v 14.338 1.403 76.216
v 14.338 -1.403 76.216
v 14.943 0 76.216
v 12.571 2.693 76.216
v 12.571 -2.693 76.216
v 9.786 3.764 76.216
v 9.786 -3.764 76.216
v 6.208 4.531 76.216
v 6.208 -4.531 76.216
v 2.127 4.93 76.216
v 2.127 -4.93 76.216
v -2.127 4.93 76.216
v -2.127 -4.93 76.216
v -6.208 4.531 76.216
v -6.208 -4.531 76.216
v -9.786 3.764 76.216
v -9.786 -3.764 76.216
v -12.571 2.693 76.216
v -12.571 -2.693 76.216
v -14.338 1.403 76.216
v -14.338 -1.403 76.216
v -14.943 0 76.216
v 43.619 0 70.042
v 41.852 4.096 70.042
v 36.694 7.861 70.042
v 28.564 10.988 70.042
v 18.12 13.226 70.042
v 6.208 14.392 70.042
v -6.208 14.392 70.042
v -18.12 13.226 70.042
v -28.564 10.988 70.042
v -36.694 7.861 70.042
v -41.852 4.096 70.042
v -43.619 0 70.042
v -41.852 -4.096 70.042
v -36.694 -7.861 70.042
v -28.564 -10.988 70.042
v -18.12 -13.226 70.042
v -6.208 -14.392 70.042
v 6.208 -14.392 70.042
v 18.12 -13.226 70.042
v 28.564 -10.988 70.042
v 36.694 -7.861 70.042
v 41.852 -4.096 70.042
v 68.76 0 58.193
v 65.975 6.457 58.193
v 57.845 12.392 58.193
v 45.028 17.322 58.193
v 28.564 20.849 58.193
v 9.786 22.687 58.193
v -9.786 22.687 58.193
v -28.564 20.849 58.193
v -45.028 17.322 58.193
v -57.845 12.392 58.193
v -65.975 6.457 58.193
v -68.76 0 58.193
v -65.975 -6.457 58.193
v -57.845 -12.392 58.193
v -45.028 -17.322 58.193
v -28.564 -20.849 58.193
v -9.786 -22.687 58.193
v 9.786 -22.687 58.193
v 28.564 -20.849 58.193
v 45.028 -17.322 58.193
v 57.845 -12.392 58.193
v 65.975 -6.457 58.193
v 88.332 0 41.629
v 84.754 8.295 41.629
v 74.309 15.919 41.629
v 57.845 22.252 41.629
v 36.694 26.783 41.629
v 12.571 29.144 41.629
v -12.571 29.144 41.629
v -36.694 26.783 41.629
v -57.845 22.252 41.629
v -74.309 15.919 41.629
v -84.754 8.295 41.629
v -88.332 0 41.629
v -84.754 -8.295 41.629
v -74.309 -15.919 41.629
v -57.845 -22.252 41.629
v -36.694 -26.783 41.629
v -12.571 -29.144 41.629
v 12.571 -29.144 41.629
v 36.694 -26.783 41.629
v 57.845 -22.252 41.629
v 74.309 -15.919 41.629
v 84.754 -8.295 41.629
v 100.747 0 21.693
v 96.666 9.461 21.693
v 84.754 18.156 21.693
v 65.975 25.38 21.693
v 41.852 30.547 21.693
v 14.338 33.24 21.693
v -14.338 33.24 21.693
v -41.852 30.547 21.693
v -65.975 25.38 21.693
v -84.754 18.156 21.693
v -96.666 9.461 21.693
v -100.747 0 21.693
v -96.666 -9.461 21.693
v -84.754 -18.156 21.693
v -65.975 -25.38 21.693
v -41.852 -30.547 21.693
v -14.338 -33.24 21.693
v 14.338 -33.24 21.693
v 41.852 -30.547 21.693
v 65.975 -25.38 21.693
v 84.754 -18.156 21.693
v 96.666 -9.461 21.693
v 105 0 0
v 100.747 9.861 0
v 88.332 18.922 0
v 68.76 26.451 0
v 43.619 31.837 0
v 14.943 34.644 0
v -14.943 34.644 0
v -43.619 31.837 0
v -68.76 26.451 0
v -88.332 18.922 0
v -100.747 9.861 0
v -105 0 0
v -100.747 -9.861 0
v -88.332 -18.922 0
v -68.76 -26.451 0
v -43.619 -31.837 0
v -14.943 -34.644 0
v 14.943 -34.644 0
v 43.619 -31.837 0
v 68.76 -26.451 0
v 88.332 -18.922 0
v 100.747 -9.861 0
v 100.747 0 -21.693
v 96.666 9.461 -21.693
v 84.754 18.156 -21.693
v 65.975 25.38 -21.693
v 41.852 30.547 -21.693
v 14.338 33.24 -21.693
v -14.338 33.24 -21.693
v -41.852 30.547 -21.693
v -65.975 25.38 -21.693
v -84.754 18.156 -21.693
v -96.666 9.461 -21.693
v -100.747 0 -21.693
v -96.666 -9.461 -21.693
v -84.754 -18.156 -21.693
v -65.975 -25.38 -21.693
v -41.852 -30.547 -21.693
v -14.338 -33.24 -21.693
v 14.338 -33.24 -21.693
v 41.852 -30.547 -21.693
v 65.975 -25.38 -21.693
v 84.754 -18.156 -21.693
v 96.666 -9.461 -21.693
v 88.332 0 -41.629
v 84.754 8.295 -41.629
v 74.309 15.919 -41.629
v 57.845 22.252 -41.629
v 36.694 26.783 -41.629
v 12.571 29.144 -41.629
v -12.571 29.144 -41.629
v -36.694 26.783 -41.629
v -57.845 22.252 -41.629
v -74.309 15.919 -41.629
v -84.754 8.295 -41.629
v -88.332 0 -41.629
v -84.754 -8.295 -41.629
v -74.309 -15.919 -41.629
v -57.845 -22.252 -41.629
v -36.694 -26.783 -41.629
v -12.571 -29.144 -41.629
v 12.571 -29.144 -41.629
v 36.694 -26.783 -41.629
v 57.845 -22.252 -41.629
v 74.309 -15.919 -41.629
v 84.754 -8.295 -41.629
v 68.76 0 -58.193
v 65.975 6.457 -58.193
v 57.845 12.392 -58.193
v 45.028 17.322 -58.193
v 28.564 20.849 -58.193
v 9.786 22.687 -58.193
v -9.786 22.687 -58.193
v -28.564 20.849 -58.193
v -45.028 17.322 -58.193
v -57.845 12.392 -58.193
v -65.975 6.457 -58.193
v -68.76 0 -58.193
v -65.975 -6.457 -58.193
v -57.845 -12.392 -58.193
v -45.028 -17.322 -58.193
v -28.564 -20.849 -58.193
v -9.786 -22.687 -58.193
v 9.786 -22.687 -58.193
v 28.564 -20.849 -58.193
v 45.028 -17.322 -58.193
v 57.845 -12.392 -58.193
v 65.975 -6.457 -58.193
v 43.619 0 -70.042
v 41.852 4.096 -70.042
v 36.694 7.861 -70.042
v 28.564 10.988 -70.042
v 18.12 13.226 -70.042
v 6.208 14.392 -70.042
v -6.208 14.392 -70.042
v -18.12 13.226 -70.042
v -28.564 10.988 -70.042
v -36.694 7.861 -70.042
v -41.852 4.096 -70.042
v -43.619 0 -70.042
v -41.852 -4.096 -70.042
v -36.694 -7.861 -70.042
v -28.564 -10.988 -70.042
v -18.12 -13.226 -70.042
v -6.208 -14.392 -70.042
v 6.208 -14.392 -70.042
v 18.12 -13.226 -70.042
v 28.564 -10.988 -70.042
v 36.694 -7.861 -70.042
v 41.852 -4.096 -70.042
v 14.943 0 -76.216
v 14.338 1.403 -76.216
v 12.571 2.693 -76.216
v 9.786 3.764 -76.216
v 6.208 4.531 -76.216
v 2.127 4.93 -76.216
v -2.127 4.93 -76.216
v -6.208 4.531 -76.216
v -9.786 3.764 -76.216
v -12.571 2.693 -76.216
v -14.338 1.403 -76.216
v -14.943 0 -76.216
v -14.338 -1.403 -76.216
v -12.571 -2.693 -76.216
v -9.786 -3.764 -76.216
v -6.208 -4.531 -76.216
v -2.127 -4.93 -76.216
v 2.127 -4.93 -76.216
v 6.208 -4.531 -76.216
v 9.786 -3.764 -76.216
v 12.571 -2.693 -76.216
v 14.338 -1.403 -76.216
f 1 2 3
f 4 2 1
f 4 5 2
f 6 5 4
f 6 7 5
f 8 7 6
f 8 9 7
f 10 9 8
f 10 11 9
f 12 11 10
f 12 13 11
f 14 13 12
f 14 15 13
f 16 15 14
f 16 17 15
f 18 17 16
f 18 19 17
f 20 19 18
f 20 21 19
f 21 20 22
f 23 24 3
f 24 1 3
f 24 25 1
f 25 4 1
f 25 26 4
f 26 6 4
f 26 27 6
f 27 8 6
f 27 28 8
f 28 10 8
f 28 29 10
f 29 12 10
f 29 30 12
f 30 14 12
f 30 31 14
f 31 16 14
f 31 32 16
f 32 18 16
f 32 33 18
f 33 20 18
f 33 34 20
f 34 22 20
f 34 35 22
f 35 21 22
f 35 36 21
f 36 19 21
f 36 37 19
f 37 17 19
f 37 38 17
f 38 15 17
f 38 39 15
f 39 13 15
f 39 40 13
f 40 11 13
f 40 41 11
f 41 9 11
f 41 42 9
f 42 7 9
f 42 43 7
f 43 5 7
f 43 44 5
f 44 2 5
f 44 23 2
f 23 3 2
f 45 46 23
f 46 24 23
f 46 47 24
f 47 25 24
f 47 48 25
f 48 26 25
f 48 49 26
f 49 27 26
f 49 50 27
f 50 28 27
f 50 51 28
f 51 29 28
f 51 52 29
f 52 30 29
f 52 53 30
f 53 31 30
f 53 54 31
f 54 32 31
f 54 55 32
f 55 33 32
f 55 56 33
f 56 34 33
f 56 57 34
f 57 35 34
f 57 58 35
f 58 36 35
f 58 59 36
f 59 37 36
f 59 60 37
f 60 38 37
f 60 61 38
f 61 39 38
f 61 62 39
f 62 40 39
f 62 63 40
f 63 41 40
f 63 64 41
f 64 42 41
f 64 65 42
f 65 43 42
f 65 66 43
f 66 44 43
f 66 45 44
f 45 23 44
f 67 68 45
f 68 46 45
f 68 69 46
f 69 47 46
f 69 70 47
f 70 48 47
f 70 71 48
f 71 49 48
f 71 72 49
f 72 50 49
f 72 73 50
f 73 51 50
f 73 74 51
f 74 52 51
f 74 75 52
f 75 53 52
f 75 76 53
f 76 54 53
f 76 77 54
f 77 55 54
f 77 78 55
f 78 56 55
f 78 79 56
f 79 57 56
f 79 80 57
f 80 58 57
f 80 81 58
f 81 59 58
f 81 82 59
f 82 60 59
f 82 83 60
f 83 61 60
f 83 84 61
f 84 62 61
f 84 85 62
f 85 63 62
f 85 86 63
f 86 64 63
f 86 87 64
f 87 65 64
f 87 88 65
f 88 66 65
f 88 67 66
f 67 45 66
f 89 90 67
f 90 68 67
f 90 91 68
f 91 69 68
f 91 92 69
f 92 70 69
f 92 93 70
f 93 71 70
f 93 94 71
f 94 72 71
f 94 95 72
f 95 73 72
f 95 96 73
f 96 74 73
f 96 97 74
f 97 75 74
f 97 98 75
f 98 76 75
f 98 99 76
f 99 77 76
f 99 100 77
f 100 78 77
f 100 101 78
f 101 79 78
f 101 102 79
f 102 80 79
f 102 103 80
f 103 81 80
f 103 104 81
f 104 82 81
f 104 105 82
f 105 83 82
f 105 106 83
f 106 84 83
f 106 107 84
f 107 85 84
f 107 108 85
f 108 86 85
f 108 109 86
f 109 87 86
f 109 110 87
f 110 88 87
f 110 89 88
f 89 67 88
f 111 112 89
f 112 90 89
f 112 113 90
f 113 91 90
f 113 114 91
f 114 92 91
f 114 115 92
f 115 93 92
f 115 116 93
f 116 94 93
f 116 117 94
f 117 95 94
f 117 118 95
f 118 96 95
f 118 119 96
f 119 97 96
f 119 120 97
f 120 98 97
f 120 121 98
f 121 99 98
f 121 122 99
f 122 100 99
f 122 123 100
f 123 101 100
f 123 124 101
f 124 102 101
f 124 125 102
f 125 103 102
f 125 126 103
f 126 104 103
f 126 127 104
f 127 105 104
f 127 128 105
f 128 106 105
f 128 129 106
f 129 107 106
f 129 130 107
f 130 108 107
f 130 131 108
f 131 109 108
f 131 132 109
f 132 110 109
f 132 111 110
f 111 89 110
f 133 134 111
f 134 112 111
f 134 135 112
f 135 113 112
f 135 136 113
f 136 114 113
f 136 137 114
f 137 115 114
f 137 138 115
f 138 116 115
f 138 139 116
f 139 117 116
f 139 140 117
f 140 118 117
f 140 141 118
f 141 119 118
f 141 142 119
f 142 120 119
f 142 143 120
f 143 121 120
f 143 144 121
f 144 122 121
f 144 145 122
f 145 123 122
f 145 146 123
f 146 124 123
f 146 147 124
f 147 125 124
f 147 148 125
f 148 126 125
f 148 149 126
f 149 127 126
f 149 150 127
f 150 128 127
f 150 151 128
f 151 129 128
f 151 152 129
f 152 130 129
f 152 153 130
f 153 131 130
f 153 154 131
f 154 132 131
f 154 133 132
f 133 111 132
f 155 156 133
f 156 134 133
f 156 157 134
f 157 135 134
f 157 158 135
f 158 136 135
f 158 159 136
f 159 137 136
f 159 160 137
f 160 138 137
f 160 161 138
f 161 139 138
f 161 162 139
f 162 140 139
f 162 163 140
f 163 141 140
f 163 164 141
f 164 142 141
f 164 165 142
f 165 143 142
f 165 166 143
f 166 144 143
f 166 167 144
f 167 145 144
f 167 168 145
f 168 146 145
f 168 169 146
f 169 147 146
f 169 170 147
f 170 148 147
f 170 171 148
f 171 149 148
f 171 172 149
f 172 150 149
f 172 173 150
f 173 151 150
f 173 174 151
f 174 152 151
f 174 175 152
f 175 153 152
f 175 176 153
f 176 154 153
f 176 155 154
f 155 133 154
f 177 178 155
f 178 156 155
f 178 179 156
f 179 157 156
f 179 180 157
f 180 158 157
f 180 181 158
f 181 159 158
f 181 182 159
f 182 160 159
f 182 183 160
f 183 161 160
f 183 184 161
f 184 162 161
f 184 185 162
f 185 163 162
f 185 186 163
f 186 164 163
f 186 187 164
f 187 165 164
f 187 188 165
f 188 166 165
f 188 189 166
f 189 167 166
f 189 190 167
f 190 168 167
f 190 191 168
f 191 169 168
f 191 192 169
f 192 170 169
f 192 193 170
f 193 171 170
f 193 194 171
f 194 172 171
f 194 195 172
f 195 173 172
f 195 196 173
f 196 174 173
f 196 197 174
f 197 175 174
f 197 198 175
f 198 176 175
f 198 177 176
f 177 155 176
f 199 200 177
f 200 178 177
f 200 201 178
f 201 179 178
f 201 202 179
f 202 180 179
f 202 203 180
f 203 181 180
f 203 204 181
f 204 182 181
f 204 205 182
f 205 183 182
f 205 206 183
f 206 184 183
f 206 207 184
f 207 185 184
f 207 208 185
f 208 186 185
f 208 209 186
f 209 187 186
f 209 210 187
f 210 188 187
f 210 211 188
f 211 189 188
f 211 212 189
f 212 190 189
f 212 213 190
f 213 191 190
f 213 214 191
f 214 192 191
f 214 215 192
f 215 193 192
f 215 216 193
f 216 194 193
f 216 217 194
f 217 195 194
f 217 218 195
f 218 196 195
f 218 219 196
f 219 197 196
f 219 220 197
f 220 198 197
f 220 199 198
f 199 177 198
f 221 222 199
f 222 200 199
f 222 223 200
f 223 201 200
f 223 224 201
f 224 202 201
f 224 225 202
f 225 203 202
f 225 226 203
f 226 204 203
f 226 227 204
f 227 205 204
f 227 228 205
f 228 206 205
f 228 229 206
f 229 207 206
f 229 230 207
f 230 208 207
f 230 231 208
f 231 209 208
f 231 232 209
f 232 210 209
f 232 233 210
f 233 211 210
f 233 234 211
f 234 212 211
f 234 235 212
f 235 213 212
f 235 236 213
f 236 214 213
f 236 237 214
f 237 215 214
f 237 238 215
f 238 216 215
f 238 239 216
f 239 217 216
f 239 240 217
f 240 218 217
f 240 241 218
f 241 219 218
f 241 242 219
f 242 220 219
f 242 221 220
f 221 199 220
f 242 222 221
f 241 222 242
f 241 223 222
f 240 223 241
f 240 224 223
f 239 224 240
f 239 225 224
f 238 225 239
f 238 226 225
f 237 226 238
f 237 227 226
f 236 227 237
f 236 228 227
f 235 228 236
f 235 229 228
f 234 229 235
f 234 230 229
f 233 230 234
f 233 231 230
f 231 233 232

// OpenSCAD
// Generated by SolidPython 1.0.1 on 2020-07-29 00:46:51


scale(v = [15, 5, 11]) {
	sphere(r = 7);
}
/***********************************************
*********      SolidPython code:      **********
************************************************
 
# import packages: SolidPython
from solid import *
from solid.utils import *
from itertools import chain, combinations, permutations


class Resize:

    def __init__(self, scad_file):
        self.scad_file = scad_file
        #self.scad_file = import_scad(scad_file)
        # cone/cylinder param:
        self.r1 = 0
        self.r2 = 0
        self.h = 0
        # rectangular prism param:
        self.w = 0
        self.l = 0
        # ellipse param:
        self.r = 0

    # import OpenScad code (file name corresponds to shape)


    # classify shape + parameters
    def assign(self, param1, param2, param3):
        if self.scad_file == 'cone.scad':
            self.r1 = param1
            self.r2 = param2
            self.h = param3
        elif self.scad_file == 'cylinder.scad':
            self.r1 = param1
            self.r2 = param2
            self.h = param3
        elif self.scad_file == 'rectangularPrism.scad':
            self.h = param1
            self.l = param2
            self.w = param3
        else:
            self.r = param1
            self.h = param2

    # resize parameters
    def iterate(self):
        x = range(3, 20, 2)
        i = 1
        if self.scad_file == 'cone.scad':
            tempList = list(permutations(x, 2))
            for temp in tempList:
                param1 = temp[0]
                param2 = temp[1]
                filepath = 'produced_scad_files/' + 'cone' + str(param1) + '_' + str(param2) + '_' + '.scad'
                scad_render_to_file(cylinder(h=param1, r1=param2, r2=0), filepath)

        elif self.scad_file == 'cylinder.scad':
            tempList = list(permutations(x, 3))
            for temp in tempList:
                param1 = temp[0]
                param2 = temp[1]
                filepath = 'produced_scad_files/' + 'cylinder' + str(param1) + '_' + str(param2) + '_' + '.scad'
                scad_render_to_file(cylinder(h=param1, r1=param2, r2=param2), filepath)

        elif self.scad_file == 'rectangularPrism.scad':
            tempList = list(permutations(x, 3))
            for temp in tempList:
                param1 = temp[0]
                param2 = temp[1]
                param3 = temp[2]
                filepath = 'produced_scad_files/' + 'rectangularPrism' + str(param1) + '_' + str(param2) + '_' + str(
                    param3) + '.scad'
                scad_render_to_file(cube(size=(param1, param2, param3)), filepath)

        elif self.scad_file == 'ellipse.scad':
            tempList = list(permutations(x, 4))
            for temp in tempList:
                param1 = temp[0]
                param2 = temp[1]
                param3 = temp[2]
                param4 = temp[3]
                filepath = 'produced_scad_files/' + 'ellipse' + str(param1) + '_' + str(param2) + '_' + str(param3) + '_' + str(param4) + '.scad'
                scad_render_to_file(scale([param1, param2, param3])(sphere(r=param4)), filepath)

    def render_to_scadfile(self):
        scad_render_to_file(scad, 'example.scad') 
 
************************************************/
